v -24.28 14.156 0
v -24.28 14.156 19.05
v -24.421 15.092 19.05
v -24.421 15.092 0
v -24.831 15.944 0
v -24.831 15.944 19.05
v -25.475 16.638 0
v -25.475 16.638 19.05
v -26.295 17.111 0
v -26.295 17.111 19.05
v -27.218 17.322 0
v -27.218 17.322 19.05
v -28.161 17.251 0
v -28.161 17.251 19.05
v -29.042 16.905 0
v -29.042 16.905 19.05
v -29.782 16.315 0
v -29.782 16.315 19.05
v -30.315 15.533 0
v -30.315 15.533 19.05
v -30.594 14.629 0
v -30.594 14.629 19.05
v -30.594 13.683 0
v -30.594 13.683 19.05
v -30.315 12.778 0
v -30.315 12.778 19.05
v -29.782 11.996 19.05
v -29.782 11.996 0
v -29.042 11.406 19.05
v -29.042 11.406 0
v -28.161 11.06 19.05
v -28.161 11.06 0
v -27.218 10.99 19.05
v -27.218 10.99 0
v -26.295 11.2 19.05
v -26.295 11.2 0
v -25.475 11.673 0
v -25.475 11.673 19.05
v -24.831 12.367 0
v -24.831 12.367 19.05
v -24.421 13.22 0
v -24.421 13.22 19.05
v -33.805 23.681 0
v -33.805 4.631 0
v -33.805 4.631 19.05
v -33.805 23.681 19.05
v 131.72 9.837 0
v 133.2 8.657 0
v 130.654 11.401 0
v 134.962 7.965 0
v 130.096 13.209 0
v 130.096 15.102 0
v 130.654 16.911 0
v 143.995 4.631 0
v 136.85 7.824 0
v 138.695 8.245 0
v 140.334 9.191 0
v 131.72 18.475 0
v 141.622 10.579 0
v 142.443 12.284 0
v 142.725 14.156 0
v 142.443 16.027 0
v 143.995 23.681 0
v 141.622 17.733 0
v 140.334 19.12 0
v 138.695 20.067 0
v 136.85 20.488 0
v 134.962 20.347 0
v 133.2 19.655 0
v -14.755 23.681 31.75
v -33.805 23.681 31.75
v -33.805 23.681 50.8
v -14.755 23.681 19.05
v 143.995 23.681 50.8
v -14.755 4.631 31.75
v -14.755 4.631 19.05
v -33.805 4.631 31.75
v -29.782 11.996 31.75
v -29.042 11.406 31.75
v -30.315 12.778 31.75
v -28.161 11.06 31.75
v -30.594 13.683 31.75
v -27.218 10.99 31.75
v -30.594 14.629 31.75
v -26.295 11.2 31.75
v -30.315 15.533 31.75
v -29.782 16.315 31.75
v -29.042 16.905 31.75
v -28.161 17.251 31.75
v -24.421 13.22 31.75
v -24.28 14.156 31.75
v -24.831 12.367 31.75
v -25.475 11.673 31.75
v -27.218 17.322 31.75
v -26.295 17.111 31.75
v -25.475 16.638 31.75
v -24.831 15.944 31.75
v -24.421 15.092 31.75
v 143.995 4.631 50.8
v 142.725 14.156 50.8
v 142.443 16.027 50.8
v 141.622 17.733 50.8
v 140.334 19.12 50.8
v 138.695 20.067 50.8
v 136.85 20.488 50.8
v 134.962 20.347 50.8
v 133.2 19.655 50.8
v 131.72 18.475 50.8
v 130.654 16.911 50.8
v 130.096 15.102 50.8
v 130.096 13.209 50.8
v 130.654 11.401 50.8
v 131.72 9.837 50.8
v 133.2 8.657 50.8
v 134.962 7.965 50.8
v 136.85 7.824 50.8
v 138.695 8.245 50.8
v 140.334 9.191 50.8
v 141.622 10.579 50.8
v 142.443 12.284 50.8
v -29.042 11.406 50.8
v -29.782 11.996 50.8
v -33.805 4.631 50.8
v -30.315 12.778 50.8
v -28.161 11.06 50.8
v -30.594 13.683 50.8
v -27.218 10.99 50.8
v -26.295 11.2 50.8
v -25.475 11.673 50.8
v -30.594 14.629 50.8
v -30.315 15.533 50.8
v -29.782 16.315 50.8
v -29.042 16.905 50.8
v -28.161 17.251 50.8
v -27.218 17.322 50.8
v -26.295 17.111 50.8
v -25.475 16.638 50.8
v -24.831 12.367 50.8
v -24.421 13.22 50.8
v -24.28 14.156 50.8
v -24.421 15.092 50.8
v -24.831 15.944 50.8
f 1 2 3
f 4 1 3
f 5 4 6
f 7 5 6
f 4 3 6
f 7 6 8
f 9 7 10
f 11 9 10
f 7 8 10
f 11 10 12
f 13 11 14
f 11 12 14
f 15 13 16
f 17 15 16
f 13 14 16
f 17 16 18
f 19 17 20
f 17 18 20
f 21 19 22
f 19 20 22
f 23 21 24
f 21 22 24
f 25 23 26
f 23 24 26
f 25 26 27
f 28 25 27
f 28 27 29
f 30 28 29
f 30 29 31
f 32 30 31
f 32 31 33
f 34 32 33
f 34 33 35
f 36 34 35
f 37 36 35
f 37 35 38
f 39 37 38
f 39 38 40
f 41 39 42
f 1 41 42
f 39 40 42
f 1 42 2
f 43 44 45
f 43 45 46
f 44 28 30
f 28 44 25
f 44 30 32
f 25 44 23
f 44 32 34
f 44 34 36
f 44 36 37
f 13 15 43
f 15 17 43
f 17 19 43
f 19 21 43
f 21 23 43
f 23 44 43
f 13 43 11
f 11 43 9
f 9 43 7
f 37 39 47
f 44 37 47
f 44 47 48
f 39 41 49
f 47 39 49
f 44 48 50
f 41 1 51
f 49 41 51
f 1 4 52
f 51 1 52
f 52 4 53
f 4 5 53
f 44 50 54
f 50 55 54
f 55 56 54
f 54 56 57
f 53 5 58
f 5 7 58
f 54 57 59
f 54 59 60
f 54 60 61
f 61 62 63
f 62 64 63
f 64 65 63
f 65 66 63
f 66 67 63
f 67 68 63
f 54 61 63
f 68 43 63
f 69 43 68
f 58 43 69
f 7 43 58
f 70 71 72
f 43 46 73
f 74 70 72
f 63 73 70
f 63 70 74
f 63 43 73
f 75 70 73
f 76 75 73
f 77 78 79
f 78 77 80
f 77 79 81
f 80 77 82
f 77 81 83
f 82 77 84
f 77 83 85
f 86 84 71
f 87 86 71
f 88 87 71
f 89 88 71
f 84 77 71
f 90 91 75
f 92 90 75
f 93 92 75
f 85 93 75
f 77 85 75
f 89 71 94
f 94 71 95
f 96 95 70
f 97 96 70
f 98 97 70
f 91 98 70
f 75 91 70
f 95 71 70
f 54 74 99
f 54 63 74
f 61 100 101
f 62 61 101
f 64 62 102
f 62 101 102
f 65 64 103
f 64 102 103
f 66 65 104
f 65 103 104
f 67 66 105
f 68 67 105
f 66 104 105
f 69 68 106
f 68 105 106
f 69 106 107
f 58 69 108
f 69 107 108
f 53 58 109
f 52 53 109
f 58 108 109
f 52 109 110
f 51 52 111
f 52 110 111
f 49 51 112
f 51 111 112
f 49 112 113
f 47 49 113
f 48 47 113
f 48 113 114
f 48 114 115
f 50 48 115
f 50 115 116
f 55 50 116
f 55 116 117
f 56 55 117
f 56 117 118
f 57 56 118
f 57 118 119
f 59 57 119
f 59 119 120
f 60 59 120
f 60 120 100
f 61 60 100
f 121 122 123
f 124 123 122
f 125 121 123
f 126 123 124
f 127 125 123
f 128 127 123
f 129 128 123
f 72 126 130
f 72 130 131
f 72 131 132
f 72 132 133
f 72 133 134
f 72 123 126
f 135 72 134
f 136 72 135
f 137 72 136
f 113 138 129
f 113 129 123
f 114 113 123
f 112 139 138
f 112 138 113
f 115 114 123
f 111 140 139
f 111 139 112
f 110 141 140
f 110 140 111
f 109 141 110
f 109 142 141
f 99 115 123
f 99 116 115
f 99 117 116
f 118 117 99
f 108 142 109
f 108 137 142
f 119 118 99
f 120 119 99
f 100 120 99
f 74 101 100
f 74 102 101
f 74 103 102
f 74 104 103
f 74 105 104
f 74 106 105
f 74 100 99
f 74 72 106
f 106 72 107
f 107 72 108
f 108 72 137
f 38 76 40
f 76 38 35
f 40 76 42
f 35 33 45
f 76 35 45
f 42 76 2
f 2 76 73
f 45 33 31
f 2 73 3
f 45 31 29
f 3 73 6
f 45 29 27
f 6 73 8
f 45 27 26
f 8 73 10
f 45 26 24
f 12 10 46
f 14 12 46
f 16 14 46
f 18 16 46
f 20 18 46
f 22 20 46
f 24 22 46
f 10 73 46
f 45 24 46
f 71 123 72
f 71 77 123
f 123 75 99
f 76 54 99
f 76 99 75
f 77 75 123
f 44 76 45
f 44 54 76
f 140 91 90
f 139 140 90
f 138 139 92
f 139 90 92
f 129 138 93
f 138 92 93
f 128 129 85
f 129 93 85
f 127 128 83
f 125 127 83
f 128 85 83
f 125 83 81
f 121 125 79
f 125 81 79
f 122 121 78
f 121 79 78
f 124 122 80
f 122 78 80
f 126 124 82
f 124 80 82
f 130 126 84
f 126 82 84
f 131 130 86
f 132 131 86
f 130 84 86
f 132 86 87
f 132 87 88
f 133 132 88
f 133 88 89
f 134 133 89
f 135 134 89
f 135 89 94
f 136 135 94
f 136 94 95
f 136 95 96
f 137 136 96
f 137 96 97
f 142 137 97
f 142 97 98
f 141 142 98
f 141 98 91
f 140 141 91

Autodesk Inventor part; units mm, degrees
ref_plane "YZ Plane" through (0, 0, 0) normal (1, 0, 0) x (0, 1, 0)
ref_plane "XZ Plane" through (0, 0, 0) normal (0, 1, 0) x (-1, 0, 0)
ref_plane "XY Plane" through (0, 0, 0) normal (0, 0, 1) x (1, 0, 0)
sketch "Sketch1" plane through (0, 0, 0) normal (0, 0, 1) x (1, 0, 0)
  line L0 (-33.8048, 23.6808) -> (143.9952, 23.6808)
  line L1 (143.9952, 23.6808) -> (143.9952, 4.6308)
  line L2 (143.9952, 4.6308) -> (-33.8048, 4.6308)
  line L3 (-33.8048, 4.6308) -> (-33.8048, 23.6808)
  point P0 (0, 0)
  dimension "d0" = 177.8
  dimension "d1" = 19.05
extrude "Extrusion1" add sketch "Sketch1" along normal blind 50.8
sketch "Sketch2" plane through (0, 0, 50.8) normal (0, 0, 1) x (1, 0, 0)
  circle A0 centre (136.3752, 14.1558) radius 6.35
  line L0 (143.9952, 4.6308) -> (143.9952, 23.6808) projected
  line L1 (-33.8048, 4.6308) -> (143.9952, 4.6308) projected
  point P0 (0, 0)
  dimension "d4" = 12.7
  dimension "d5" = 7.62
  dimension "d6" = 9.525
extrude "Extrusion2" cut sketch "Sketch2" against normal blind 50.8
sketch "Sketch3" plane through (-33.8048, 23.6808, 0) normal (0, 1, 0) x (1, 0, 0)
  line L0 (0, 0) -> (0, -50.8) projected
  line L1 (0, -31.75) -> (19.05, -31.75)
  line L2 (19.05, -31.75) -> (19.05, -19.05)
  line L3 (19.05, -19.05) -> (0, -19.05)
  line L4 (0, -19.05) -> (0, -31.75)
  line L5 (177.8, 0) -> (0, 0) projected
  point P0 (33.8048, 0)
  point P1 (0, -19.05)
  dimension "d9" = 19.05
  dimension "d10" = 12.7
  dimension "d11" = 19.05
extrude "Extrusion3" cut sketch "Sketch3" against normal blind 50.8
sketch "Sketch4" plane through (-33.8048, 23.6808, 19.05) normal (0, 0, 1) x (1, 0, 0)
  circle A0 centre (6.35, -9.525) radius 3.175
  line L0 (19.05, 0) -> (19.05, -19.05) projected
  line L1 (0, -19.05) -> (177.8, -19.05) projected
  point P0 (33.8048, -23.6808)
  dimension "d14" = 6.35
  dimension "d15" = 12.7
  dimension "d16" = 9.525
extrude "Extrusion4" cut sketch "Sketch4" along normal mid plane 127
properties part number "Ramp Base"
